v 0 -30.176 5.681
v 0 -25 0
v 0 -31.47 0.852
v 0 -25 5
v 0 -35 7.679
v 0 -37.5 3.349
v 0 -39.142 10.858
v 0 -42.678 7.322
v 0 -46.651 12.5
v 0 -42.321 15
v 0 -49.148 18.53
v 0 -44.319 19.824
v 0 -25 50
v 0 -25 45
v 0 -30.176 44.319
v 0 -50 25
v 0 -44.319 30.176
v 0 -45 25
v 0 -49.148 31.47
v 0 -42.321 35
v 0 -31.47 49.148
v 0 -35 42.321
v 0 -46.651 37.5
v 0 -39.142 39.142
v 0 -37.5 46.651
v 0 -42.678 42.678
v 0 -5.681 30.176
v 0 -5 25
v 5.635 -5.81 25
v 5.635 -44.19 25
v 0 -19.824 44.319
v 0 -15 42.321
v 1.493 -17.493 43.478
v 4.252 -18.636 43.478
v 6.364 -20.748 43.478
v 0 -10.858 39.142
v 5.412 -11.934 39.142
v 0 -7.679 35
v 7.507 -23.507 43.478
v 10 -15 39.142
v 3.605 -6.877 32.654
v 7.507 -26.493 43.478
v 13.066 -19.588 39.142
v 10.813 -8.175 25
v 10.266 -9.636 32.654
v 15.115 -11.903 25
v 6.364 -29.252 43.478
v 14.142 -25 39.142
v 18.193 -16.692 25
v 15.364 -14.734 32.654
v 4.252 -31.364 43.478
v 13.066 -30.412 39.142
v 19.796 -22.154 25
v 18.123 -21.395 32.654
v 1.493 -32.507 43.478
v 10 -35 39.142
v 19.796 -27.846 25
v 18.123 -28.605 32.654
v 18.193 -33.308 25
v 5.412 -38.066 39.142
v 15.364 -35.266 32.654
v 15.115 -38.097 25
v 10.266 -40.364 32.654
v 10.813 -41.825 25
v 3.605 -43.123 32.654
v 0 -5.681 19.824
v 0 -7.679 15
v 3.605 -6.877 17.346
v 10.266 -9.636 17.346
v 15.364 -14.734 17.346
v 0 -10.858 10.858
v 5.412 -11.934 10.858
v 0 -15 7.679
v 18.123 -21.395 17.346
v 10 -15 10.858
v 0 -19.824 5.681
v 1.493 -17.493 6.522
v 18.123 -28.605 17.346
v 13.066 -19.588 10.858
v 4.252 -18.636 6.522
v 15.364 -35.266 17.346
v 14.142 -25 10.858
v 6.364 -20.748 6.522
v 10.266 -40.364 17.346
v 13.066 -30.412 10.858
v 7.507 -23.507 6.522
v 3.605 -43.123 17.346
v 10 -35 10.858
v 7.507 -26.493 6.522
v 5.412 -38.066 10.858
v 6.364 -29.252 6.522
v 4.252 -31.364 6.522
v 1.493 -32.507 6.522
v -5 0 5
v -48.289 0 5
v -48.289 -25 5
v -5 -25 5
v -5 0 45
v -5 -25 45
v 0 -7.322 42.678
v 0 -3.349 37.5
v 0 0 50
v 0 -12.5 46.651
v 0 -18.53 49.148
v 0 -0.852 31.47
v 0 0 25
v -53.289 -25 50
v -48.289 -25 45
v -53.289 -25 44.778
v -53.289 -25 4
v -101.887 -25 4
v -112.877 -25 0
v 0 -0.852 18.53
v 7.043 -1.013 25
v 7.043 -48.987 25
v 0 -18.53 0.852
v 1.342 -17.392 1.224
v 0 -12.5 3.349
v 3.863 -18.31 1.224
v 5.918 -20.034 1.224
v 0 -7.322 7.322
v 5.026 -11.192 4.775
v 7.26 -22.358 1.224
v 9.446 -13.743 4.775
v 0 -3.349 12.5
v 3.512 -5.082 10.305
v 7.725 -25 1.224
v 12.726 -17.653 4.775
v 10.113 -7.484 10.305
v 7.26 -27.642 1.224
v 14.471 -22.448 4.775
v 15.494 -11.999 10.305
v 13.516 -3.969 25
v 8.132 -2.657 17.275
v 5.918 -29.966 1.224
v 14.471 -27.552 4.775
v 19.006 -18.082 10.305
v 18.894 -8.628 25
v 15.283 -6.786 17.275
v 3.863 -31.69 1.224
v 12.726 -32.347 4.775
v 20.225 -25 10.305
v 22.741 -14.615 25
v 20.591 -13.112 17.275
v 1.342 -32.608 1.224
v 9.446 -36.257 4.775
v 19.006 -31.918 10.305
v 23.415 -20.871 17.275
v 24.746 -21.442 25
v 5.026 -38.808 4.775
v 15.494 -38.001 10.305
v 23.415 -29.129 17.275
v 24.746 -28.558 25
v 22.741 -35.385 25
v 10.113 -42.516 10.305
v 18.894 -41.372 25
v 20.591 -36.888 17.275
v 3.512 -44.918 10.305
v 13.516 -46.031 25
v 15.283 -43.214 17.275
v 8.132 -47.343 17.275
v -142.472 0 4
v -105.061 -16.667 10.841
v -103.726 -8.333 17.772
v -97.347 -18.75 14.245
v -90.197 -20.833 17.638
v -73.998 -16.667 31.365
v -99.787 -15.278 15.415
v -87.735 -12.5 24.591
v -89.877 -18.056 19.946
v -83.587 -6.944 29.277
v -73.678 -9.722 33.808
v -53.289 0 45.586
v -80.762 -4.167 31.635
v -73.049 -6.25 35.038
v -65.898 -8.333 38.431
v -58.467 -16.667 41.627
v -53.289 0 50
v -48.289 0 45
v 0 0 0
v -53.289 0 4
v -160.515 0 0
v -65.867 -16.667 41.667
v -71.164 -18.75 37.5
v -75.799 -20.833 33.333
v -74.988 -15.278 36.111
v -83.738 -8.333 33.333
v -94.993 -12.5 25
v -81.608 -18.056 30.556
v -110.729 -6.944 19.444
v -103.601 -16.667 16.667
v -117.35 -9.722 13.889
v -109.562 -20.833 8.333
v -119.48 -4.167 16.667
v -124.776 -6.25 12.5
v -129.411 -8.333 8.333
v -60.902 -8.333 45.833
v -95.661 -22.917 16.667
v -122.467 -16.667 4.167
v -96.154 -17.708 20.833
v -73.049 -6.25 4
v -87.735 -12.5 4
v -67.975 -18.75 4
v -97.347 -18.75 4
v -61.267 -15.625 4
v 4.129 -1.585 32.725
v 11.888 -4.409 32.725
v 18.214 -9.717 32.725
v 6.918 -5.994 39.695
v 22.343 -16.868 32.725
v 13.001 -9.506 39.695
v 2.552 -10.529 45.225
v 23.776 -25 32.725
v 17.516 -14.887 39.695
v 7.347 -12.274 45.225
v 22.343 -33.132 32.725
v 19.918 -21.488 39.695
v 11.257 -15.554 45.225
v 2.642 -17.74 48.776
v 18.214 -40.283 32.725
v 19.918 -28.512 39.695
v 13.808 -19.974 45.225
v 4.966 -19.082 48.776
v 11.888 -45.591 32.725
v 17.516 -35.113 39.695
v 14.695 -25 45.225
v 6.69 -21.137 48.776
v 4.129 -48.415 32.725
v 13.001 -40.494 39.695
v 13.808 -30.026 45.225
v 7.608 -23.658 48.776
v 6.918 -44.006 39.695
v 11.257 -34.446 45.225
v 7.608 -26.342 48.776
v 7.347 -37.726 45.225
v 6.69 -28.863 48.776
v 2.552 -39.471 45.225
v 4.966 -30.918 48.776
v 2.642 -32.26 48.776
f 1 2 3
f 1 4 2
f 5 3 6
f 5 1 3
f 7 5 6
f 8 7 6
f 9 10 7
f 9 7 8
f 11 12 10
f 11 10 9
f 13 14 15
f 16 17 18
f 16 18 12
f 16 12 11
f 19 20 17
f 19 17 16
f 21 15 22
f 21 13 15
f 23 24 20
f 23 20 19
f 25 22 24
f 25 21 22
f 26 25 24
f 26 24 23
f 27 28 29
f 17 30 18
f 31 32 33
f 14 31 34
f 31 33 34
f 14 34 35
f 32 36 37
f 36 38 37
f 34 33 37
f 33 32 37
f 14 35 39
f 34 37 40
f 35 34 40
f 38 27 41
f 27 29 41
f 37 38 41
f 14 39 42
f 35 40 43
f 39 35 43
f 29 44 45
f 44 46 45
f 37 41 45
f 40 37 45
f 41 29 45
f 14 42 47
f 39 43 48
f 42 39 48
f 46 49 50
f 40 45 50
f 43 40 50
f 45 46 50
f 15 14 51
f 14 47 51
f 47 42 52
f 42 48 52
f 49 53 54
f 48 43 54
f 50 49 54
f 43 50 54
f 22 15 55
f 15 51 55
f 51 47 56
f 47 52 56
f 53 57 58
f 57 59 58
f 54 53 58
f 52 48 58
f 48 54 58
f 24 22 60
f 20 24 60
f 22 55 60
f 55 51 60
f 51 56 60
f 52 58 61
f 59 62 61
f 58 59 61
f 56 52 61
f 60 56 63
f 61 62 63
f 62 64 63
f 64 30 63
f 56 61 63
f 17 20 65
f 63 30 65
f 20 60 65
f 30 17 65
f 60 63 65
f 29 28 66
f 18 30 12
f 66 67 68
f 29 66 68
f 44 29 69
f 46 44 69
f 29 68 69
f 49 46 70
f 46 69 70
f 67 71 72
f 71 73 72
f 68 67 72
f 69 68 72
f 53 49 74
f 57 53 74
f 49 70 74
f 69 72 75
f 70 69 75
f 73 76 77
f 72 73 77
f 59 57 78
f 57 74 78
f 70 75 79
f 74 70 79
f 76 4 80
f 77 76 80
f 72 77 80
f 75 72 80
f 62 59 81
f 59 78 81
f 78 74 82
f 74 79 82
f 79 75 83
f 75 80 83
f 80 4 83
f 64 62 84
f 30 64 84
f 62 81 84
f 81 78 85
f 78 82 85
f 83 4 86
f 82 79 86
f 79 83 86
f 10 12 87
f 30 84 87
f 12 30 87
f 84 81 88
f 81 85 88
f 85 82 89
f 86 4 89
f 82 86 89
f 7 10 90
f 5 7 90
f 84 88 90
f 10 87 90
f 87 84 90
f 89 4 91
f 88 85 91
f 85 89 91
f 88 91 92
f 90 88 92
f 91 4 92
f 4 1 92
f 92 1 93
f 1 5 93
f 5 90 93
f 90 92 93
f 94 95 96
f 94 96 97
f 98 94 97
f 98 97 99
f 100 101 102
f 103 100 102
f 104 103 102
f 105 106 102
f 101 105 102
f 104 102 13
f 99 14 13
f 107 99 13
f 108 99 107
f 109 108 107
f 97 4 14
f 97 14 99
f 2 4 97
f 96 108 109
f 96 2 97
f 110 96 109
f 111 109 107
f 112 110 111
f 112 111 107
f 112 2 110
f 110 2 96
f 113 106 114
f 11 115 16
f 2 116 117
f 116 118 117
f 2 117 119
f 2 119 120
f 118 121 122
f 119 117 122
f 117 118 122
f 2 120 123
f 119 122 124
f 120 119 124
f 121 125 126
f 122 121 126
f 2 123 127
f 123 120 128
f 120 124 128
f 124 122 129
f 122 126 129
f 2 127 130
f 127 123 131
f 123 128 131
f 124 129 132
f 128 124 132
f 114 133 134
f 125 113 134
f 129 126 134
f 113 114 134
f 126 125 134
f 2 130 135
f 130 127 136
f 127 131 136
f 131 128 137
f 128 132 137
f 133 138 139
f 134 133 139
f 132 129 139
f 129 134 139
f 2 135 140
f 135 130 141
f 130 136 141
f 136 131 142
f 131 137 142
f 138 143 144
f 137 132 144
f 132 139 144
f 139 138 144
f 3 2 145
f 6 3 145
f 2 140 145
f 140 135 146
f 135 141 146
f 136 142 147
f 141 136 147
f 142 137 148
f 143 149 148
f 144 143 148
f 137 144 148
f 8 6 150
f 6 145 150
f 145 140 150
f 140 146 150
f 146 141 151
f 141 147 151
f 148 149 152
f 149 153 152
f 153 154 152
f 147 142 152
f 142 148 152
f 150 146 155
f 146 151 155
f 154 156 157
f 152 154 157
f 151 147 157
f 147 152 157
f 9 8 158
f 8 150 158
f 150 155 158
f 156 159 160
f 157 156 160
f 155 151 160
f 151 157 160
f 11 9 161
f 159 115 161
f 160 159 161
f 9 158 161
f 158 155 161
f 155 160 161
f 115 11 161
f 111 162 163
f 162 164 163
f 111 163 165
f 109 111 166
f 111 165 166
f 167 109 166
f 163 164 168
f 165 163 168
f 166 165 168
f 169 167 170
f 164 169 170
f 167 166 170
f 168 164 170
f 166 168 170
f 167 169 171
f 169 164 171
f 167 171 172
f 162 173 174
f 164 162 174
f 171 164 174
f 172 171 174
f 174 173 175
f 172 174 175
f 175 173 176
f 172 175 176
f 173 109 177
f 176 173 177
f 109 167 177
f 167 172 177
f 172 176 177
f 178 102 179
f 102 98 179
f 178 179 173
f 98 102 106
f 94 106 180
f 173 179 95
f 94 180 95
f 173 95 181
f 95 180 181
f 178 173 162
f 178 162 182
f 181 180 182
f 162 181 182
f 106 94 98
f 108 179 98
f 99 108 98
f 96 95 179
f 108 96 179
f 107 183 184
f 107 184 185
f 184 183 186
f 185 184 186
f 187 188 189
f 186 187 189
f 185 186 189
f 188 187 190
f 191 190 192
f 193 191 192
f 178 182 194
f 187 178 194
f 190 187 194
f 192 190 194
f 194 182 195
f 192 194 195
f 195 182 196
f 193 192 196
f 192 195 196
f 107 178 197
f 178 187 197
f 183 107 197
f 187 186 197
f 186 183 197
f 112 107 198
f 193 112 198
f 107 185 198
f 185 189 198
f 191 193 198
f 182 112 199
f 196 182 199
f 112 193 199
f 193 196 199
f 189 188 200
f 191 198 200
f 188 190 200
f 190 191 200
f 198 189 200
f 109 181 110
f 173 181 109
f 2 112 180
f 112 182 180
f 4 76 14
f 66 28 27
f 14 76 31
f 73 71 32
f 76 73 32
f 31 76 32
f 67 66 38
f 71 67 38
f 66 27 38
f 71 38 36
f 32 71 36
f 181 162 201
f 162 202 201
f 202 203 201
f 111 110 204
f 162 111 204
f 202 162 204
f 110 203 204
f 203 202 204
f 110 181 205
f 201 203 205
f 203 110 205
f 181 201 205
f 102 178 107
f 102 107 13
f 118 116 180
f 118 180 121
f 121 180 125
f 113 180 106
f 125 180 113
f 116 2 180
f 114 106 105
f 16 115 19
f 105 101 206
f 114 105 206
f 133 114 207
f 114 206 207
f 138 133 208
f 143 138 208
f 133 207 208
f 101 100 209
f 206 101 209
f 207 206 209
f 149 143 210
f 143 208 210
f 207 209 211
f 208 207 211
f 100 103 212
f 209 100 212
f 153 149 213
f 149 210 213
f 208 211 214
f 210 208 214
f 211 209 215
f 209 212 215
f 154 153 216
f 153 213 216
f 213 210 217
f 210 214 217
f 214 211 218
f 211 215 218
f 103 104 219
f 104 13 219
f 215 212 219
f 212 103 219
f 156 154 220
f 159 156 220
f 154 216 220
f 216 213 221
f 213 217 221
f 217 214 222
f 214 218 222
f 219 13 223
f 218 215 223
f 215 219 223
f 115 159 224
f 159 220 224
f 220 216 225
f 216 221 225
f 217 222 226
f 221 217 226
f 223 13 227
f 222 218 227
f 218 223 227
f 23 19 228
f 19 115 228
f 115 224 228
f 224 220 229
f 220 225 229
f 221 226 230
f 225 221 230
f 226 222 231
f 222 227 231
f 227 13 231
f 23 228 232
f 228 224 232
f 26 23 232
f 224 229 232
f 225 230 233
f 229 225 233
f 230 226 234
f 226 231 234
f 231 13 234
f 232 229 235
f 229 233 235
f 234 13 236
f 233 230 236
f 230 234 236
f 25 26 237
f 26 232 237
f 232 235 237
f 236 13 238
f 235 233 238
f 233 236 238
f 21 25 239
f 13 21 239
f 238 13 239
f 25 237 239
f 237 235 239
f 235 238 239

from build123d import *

# Parameters (mm, degrees)
F0_W          = 53.2894550107
F0_H          = 50
F0_W_2        = 43.2894550107
F0_H_2        = 40
F1_DEPTH      = 25
F3_ANGLE_BACK = 90
F3_ANGLE      = 180


with BuildPart() as f1:
    # F0 (on Front) → F1 (new body)
    with BuildSketch(Plane.XZ):
        with Locations((-26.6447275054, 25)):
            Rectangle(F0_W, F0_H)
        with Locations((-26.6447275054, 25)):
            Rectangle(F0_W_2, F0_H_2, mode=Mode.SUBTRACT)
    extrude(amount=F1_DEPTH)

    # F2 (on face) → F3 (revolve)
    with BuildSketch(Plane.XZ.offset(25), mode=Mode.PRIVATE) as f3_sk:
        with BuildLine():
            ThreePointArc((0, 0), (17.6776695297, 7.3223304703), (25, 25))
            ThreePointArc((25, 25), (17.6776695297, 42.6776695297), (0, 50))
            Line((0, 50), (0, 45))
            ThreePointArc((0, 45), (14.1421356237, 39.1421356237), (20, 25))
            ThreePointArc((20, 25), (14.1421356237, 10.8578643763), (0, 5))
            Line((0, 5), (0, 0))
        make_face()
    revolve(f3_sk.sketch.rotate(Axis((0, -25, 25), (0, 0, -1)), -F3_ANGLE_BACK), axis=Axis((0, -25, 25), (0, 0, -1)), revolution_arc=F3_ANGLE)

    # F2 (on face) → F5 section 0
    with BuildSketch(Plane.XZ.offset(25)):
        Polygon((-53.2894550107, 44.7783708427), (-53.2894550107, 50), (-112.8771346405, 0), (-53.2894550107, 0), (-53.2894550107, 4), (-101.8872249626, 4), align=None)
    # F4 (on face) → F5 section 1
    with BuildSketch(Plane(origin=(0, 0, 0), x_dir=(-1, 0, 0), z_dir=(0, 1, 0))):
        Polygon((160.5148010362, 0), (53.2894550107, 50), (53.2894550107, 45.5864883242), (142.4719670216, 4), (53.2894550107, 4), (53.2894550107, 0), align=None)
    loft()


solid = f1.part
